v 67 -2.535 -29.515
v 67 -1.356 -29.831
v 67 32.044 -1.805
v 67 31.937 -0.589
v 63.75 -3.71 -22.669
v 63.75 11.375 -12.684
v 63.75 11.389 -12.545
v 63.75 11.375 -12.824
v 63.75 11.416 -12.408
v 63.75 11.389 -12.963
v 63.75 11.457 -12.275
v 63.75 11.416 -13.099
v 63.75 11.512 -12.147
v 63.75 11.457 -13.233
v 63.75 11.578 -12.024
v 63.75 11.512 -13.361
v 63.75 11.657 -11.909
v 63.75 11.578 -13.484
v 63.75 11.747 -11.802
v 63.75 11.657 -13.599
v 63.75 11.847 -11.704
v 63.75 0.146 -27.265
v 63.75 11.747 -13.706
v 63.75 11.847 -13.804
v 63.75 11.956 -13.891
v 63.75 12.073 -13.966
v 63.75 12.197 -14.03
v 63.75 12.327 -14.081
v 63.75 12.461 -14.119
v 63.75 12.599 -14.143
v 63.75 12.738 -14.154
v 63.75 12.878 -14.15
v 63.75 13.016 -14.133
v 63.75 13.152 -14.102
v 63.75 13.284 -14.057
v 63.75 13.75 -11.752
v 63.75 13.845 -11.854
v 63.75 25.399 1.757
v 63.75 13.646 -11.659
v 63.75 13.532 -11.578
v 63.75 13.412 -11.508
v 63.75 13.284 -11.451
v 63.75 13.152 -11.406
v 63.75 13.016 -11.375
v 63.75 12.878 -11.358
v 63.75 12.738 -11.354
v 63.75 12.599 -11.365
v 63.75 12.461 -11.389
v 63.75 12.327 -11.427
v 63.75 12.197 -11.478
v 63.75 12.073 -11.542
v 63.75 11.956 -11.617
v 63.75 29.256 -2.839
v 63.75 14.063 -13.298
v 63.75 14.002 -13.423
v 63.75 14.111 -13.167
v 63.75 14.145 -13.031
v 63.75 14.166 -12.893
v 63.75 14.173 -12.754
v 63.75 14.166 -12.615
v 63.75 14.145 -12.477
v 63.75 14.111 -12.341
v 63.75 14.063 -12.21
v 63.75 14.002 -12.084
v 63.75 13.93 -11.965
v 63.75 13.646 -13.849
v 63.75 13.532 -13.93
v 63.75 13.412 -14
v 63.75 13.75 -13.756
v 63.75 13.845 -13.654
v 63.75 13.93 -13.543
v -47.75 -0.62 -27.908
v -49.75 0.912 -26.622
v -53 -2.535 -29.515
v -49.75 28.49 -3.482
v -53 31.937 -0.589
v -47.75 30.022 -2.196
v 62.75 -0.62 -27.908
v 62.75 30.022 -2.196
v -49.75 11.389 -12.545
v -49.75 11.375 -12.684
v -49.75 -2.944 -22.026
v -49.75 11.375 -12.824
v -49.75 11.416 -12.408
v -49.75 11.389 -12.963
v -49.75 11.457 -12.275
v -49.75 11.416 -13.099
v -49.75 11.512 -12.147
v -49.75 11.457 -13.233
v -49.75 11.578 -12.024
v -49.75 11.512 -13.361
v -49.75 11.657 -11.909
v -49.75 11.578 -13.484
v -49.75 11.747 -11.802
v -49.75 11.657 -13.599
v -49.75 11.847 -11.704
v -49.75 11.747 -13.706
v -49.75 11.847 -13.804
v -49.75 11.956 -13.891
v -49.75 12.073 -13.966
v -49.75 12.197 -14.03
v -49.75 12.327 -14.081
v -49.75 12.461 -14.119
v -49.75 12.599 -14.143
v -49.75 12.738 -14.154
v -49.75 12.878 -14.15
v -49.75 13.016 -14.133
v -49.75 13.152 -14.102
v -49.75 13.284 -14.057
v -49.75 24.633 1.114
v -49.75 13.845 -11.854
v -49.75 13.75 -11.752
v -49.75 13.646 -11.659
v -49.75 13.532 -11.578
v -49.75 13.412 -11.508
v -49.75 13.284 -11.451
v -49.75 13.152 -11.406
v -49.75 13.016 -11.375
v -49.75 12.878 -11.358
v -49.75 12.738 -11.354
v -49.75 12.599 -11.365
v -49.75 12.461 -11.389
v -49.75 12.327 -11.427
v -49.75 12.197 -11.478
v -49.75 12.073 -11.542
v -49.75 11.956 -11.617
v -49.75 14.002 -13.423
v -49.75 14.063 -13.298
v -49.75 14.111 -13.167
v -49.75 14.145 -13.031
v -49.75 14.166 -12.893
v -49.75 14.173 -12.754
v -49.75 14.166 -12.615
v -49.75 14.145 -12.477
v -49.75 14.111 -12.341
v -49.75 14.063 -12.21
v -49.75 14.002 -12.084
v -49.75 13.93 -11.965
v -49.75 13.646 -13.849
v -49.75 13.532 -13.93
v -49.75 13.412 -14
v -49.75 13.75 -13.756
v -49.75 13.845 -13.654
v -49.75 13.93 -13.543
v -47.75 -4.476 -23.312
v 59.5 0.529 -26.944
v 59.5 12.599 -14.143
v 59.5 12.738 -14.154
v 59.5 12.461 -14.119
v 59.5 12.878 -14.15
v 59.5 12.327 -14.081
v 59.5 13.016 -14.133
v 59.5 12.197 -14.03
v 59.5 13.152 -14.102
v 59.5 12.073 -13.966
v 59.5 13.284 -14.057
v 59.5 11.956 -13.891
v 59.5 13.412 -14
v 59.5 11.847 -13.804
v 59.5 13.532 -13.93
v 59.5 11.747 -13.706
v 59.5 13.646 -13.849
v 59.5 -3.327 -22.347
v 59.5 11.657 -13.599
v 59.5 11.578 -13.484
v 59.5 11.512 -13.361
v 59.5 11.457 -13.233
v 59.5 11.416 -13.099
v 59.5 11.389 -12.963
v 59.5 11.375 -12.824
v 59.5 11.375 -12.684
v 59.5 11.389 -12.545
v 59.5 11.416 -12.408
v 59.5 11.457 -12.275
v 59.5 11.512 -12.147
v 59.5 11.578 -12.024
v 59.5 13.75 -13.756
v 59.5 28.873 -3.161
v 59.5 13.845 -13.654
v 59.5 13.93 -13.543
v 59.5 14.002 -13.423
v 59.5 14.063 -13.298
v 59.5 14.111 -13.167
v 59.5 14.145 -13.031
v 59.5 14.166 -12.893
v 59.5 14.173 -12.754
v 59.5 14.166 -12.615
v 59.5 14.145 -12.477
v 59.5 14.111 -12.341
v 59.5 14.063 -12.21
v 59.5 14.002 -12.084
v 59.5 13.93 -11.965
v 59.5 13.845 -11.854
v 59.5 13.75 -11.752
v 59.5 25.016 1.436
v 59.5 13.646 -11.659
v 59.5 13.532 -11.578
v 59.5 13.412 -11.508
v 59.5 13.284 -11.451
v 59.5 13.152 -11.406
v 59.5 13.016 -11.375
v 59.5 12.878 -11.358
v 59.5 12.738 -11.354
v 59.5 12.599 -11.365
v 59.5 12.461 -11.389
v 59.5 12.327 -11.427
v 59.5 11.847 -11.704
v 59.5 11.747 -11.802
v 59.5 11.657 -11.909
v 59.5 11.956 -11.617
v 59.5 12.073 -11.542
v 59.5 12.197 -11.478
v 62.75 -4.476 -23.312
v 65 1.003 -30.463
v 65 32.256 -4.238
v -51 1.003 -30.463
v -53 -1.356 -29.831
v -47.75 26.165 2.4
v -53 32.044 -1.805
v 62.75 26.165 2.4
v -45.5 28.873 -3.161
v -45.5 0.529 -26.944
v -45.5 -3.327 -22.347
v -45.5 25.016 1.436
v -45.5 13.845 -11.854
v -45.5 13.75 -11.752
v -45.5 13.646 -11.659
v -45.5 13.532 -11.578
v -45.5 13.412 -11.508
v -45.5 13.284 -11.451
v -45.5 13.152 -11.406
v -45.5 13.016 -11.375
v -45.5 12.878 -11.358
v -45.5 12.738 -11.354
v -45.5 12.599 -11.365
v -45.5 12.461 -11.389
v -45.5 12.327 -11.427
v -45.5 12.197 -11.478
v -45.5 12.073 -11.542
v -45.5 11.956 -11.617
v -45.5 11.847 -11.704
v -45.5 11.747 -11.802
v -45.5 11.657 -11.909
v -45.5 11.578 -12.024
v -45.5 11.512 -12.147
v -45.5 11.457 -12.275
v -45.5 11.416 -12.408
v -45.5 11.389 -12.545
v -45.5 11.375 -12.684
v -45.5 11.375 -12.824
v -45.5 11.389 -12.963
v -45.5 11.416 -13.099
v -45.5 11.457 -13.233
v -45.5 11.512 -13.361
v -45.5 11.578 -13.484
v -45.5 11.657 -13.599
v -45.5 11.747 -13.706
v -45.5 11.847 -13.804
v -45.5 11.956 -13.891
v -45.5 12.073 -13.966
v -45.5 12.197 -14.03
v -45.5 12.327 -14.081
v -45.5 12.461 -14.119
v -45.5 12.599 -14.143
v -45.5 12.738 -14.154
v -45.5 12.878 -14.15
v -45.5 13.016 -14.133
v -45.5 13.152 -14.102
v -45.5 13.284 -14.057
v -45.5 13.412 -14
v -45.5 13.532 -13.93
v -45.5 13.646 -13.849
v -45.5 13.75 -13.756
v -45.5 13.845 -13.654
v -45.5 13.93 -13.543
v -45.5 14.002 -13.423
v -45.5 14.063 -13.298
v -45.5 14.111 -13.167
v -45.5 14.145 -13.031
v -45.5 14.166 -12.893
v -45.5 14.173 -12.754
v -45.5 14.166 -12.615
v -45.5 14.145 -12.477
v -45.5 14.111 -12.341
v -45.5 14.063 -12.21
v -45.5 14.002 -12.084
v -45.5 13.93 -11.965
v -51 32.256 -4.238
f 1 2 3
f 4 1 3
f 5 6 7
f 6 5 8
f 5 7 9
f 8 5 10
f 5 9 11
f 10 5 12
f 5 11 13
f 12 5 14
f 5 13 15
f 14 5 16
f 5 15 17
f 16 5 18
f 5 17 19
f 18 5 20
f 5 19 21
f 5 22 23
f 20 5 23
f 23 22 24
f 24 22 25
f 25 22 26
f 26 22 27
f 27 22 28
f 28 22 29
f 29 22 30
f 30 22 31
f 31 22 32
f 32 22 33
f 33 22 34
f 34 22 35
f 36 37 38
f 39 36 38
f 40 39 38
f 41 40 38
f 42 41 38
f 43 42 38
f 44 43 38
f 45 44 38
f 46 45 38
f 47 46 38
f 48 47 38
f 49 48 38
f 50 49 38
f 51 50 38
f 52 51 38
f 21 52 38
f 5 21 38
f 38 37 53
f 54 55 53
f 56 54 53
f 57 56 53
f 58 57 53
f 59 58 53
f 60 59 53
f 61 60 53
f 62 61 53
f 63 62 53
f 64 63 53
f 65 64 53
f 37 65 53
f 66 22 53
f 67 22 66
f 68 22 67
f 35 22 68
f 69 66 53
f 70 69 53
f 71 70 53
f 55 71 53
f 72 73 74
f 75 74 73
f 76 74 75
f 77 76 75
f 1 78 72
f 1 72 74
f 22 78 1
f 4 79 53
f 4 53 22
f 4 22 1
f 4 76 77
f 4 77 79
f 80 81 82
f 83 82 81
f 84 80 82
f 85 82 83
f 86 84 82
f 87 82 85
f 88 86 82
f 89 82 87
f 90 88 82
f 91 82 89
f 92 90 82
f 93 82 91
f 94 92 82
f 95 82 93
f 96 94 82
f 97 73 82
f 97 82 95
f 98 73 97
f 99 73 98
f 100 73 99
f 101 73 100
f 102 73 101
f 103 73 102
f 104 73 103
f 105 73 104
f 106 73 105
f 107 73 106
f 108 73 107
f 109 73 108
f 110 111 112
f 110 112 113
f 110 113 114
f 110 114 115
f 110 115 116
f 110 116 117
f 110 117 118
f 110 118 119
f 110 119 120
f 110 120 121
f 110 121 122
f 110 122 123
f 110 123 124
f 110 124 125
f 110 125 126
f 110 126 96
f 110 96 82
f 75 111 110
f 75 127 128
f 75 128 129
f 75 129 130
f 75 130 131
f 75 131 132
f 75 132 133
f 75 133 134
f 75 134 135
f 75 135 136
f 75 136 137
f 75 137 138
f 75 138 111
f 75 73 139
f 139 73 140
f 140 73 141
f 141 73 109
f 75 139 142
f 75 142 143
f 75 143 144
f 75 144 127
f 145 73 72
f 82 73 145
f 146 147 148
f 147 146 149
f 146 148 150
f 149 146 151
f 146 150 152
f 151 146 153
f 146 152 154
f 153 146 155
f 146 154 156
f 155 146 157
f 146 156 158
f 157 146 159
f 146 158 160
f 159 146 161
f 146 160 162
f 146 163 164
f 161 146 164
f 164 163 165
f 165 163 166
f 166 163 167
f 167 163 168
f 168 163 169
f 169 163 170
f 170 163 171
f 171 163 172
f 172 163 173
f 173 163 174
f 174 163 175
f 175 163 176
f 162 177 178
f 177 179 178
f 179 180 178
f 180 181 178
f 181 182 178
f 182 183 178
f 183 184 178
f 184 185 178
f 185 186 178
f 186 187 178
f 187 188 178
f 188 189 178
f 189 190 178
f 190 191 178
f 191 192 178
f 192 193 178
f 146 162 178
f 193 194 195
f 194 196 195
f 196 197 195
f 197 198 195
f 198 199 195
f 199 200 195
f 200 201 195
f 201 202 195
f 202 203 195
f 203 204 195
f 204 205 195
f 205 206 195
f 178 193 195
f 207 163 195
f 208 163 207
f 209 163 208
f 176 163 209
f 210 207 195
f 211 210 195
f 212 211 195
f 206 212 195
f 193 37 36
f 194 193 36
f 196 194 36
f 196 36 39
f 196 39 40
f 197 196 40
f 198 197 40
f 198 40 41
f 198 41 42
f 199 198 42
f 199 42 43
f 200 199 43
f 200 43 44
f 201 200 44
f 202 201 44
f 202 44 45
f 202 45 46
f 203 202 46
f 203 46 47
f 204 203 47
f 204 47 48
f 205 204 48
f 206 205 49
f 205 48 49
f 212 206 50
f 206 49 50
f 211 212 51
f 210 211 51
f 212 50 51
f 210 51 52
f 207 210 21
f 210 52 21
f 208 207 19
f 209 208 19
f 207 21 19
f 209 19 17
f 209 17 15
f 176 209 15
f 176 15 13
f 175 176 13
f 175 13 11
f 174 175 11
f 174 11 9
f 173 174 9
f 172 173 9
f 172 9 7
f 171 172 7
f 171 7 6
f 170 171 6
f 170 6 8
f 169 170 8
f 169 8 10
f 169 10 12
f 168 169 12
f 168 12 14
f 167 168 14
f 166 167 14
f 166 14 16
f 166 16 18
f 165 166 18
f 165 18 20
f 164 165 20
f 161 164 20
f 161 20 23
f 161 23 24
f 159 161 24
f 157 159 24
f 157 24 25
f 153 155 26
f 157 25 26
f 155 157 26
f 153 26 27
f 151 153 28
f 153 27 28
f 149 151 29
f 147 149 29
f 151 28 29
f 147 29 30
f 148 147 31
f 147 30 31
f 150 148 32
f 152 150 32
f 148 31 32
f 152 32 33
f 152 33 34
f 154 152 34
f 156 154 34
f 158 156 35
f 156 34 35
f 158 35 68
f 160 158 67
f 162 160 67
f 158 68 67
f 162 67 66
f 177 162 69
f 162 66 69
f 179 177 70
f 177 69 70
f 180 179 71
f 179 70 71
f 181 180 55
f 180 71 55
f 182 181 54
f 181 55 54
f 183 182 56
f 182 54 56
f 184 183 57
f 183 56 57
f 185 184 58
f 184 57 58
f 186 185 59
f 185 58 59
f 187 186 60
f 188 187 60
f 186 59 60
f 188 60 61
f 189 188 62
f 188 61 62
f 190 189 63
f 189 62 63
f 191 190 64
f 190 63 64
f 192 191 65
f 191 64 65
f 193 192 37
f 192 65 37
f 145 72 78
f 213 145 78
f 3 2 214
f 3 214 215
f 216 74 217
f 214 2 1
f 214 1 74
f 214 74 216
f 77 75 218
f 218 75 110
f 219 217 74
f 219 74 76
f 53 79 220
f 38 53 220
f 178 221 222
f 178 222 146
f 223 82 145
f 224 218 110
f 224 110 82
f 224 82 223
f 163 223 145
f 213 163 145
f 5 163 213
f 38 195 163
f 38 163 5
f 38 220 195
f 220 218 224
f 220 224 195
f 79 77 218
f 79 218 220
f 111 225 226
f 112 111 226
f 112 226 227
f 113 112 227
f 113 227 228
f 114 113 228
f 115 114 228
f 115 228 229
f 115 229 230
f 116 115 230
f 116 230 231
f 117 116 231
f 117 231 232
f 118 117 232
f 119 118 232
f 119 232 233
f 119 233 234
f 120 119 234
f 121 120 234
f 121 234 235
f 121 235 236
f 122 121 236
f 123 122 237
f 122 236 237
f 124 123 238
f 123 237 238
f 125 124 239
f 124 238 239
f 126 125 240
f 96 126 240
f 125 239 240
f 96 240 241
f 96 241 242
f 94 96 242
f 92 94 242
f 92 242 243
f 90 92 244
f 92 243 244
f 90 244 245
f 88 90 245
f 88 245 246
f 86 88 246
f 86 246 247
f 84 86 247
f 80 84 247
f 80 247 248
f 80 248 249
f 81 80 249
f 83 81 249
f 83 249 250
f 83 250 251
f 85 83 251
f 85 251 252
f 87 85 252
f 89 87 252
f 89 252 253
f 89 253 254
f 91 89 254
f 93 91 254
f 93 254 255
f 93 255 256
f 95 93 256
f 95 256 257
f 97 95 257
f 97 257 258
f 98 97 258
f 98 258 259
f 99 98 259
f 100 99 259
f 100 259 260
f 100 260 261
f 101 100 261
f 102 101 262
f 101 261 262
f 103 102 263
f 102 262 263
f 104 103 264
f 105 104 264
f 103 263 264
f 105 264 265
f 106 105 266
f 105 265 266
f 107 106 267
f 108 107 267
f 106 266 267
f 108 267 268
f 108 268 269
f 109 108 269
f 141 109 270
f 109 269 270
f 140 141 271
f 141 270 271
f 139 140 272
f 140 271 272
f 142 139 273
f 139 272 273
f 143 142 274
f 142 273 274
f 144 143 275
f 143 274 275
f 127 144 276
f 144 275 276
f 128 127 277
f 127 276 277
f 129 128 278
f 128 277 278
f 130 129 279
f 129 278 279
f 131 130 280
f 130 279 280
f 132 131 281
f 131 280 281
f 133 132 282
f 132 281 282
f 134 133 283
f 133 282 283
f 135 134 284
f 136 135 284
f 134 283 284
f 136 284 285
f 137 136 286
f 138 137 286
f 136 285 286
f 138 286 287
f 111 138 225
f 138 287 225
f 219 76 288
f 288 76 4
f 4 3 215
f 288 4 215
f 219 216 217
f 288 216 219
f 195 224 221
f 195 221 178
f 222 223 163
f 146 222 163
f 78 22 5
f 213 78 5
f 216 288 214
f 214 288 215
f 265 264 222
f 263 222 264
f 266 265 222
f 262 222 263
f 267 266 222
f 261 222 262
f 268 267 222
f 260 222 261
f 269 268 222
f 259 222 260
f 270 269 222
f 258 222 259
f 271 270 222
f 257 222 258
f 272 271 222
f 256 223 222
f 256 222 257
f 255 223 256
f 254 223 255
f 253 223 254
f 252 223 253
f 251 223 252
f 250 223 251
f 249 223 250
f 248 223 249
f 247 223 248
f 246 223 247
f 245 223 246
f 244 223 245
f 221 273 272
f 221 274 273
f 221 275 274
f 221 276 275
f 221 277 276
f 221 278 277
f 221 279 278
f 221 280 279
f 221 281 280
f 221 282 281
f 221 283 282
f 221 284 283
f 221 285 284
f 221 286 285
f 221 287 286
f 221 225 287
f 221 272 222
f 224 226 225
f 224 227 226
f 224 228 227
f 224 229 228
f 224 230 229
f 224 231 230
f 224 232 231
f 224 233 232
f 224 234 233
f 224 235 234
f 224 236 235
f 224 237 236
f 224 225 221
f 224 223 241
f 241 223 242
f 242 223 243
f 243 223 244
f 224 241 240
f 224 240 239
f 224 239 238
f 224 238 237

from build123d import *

# Parameters (mm, degrees)
SKETCH018_W             = 120
SKETCH018_H             = 45
PAD003_DEPTH            = 3
SKETCH019_W             = 113.5
SKETCH019_H             = 40
PAD004_DEPTH            = 6
SKETCH020_R             = 1.4
POCKET008_DEPTH         = 116.751
POCKET012_DEPTH         = 376.952357
CHAMFER008_SIZE         = 2
SKETCH021_W             = 105
SKETCH021_H             = 37
POCKET013_DEPTH         = 6
CHAMFER009_SIZE         = 2
CHAMFER010_SIZE         = 1
CHAMFER011_SIZE         = 1
CHAMFER012_SIZE         = 2
BODY001_PLACEMENT_ANGLE = 50


with BuildPart() as part:
    # Sketch018 → Pad003 (new body)
    with BuildSketch(Plane.XZ):
        Rectangle(SKETCH018_W, SKETCH018_H)
    extrude(amount=PAD003_DEPTH)

    # Sketch019 (on Face6 of Pad003) → Pad004 (join)
    with BuildSketch(Plane.XZ.offset(3)):
        Rectangle(SKETCH019_W, SKETCH019_H)
    extrude(amount=PAD004_DEPTH)

    # Sketch020 (on Face8 of Pad004) → Pocket008 (cut, through all)
    with BuildSketch(Plane(origin=(56.75, 0, 0), x_dir=(0, 0, 1), z_dir=(1, 0, 0))):
        with Locations((0, 6)):
            Circle(SKETCH020_R)
    extrude(amount=-POCKET008_DEPTH, mode=Mode.SUBTRACT)

    # Sketch024 (on Face3 of Pocket008) → Pocket012 (cut, through all)
    with BuildSketch(Plane(origin=(60, 0, 0), x_dir=(0, 0, 1), z_dir=(1, 0, 0))):
        Polygon((-22.5, 3), (-17.875456, -3.604533), (-35.516254, -3.604533), align=None)
    pocket012 = extrude(amount=-POCKET012_DEPTH, mode=Mode.SUBTRACT)

    # Mirrored: Pocket012 across Sketch024 V_Axis
    add(pocket012.mirror(Plane(origin=(60, 0, 0), x_dir=(1, 0, 0), z_dir=(0, 0, 1))), mode=Mode.SUBTRACT)

    # Chamfer008
    chamfer008_edges = [part.edges().sort_by_distance(p)[0] for p in [
        (60, 0, 0),
        (-60, 0, 0),
    ]]
    chamfer(chamfer008_edges, length=CHAMFER008_SIZE)

    # Sketch021 → Pocket013 (cut)
    with BuildSketch(Plane.XZ.offset(9)):
        Rectangle(SKETCH021_W, SKETCH021_H)
    extrude(amount=-POCKET013_DEPTH, mode=Mode.SUBTRACT)

    # Chamfer009
    chamfer009_edges = [part.edges().sort_by_distance(p)[0] for p in [
        (-56.75, -6, -20),
    ]]
    chamfer(chamfer009_edges, length=CHAMFER009_SIZE)

    # Chamfer010
    chamfer010_edges = [part.edges().sort_by_distance(p)[0] for p in [
        (56.75, -6, -20),
    ]]
    chamfer(chamfer010_edges, length=CHAMFER010_SIZE)

    # Chamfer011
    chamfer011_edges = [part.edges().sort_by_distance(p)[0] for p in [
        (56.75, -6, 20),
    ]]
    chamfer(chamfer011_edges, length=CHAMFER011_SIZE)

    # Chamfer012
    chamfer012_edges = [part.edges().sort_by_distance(p)[0] for p in [
        (-56.75, -6, 20),
    ]]
    chamfer(chamfer012_edges, length=CHAMFER012_SIZE)


with BuildPart() as part_1:
    # Body001 placement: moved
    add(part.part.moved(Location((7, 16.629636, -17.350208))).rotate(Axis((7, 16.629636, -17.350208), (-1, 0, 0)), BODY001_PLACEMENT_ANGLE))


solid = part_1.part
